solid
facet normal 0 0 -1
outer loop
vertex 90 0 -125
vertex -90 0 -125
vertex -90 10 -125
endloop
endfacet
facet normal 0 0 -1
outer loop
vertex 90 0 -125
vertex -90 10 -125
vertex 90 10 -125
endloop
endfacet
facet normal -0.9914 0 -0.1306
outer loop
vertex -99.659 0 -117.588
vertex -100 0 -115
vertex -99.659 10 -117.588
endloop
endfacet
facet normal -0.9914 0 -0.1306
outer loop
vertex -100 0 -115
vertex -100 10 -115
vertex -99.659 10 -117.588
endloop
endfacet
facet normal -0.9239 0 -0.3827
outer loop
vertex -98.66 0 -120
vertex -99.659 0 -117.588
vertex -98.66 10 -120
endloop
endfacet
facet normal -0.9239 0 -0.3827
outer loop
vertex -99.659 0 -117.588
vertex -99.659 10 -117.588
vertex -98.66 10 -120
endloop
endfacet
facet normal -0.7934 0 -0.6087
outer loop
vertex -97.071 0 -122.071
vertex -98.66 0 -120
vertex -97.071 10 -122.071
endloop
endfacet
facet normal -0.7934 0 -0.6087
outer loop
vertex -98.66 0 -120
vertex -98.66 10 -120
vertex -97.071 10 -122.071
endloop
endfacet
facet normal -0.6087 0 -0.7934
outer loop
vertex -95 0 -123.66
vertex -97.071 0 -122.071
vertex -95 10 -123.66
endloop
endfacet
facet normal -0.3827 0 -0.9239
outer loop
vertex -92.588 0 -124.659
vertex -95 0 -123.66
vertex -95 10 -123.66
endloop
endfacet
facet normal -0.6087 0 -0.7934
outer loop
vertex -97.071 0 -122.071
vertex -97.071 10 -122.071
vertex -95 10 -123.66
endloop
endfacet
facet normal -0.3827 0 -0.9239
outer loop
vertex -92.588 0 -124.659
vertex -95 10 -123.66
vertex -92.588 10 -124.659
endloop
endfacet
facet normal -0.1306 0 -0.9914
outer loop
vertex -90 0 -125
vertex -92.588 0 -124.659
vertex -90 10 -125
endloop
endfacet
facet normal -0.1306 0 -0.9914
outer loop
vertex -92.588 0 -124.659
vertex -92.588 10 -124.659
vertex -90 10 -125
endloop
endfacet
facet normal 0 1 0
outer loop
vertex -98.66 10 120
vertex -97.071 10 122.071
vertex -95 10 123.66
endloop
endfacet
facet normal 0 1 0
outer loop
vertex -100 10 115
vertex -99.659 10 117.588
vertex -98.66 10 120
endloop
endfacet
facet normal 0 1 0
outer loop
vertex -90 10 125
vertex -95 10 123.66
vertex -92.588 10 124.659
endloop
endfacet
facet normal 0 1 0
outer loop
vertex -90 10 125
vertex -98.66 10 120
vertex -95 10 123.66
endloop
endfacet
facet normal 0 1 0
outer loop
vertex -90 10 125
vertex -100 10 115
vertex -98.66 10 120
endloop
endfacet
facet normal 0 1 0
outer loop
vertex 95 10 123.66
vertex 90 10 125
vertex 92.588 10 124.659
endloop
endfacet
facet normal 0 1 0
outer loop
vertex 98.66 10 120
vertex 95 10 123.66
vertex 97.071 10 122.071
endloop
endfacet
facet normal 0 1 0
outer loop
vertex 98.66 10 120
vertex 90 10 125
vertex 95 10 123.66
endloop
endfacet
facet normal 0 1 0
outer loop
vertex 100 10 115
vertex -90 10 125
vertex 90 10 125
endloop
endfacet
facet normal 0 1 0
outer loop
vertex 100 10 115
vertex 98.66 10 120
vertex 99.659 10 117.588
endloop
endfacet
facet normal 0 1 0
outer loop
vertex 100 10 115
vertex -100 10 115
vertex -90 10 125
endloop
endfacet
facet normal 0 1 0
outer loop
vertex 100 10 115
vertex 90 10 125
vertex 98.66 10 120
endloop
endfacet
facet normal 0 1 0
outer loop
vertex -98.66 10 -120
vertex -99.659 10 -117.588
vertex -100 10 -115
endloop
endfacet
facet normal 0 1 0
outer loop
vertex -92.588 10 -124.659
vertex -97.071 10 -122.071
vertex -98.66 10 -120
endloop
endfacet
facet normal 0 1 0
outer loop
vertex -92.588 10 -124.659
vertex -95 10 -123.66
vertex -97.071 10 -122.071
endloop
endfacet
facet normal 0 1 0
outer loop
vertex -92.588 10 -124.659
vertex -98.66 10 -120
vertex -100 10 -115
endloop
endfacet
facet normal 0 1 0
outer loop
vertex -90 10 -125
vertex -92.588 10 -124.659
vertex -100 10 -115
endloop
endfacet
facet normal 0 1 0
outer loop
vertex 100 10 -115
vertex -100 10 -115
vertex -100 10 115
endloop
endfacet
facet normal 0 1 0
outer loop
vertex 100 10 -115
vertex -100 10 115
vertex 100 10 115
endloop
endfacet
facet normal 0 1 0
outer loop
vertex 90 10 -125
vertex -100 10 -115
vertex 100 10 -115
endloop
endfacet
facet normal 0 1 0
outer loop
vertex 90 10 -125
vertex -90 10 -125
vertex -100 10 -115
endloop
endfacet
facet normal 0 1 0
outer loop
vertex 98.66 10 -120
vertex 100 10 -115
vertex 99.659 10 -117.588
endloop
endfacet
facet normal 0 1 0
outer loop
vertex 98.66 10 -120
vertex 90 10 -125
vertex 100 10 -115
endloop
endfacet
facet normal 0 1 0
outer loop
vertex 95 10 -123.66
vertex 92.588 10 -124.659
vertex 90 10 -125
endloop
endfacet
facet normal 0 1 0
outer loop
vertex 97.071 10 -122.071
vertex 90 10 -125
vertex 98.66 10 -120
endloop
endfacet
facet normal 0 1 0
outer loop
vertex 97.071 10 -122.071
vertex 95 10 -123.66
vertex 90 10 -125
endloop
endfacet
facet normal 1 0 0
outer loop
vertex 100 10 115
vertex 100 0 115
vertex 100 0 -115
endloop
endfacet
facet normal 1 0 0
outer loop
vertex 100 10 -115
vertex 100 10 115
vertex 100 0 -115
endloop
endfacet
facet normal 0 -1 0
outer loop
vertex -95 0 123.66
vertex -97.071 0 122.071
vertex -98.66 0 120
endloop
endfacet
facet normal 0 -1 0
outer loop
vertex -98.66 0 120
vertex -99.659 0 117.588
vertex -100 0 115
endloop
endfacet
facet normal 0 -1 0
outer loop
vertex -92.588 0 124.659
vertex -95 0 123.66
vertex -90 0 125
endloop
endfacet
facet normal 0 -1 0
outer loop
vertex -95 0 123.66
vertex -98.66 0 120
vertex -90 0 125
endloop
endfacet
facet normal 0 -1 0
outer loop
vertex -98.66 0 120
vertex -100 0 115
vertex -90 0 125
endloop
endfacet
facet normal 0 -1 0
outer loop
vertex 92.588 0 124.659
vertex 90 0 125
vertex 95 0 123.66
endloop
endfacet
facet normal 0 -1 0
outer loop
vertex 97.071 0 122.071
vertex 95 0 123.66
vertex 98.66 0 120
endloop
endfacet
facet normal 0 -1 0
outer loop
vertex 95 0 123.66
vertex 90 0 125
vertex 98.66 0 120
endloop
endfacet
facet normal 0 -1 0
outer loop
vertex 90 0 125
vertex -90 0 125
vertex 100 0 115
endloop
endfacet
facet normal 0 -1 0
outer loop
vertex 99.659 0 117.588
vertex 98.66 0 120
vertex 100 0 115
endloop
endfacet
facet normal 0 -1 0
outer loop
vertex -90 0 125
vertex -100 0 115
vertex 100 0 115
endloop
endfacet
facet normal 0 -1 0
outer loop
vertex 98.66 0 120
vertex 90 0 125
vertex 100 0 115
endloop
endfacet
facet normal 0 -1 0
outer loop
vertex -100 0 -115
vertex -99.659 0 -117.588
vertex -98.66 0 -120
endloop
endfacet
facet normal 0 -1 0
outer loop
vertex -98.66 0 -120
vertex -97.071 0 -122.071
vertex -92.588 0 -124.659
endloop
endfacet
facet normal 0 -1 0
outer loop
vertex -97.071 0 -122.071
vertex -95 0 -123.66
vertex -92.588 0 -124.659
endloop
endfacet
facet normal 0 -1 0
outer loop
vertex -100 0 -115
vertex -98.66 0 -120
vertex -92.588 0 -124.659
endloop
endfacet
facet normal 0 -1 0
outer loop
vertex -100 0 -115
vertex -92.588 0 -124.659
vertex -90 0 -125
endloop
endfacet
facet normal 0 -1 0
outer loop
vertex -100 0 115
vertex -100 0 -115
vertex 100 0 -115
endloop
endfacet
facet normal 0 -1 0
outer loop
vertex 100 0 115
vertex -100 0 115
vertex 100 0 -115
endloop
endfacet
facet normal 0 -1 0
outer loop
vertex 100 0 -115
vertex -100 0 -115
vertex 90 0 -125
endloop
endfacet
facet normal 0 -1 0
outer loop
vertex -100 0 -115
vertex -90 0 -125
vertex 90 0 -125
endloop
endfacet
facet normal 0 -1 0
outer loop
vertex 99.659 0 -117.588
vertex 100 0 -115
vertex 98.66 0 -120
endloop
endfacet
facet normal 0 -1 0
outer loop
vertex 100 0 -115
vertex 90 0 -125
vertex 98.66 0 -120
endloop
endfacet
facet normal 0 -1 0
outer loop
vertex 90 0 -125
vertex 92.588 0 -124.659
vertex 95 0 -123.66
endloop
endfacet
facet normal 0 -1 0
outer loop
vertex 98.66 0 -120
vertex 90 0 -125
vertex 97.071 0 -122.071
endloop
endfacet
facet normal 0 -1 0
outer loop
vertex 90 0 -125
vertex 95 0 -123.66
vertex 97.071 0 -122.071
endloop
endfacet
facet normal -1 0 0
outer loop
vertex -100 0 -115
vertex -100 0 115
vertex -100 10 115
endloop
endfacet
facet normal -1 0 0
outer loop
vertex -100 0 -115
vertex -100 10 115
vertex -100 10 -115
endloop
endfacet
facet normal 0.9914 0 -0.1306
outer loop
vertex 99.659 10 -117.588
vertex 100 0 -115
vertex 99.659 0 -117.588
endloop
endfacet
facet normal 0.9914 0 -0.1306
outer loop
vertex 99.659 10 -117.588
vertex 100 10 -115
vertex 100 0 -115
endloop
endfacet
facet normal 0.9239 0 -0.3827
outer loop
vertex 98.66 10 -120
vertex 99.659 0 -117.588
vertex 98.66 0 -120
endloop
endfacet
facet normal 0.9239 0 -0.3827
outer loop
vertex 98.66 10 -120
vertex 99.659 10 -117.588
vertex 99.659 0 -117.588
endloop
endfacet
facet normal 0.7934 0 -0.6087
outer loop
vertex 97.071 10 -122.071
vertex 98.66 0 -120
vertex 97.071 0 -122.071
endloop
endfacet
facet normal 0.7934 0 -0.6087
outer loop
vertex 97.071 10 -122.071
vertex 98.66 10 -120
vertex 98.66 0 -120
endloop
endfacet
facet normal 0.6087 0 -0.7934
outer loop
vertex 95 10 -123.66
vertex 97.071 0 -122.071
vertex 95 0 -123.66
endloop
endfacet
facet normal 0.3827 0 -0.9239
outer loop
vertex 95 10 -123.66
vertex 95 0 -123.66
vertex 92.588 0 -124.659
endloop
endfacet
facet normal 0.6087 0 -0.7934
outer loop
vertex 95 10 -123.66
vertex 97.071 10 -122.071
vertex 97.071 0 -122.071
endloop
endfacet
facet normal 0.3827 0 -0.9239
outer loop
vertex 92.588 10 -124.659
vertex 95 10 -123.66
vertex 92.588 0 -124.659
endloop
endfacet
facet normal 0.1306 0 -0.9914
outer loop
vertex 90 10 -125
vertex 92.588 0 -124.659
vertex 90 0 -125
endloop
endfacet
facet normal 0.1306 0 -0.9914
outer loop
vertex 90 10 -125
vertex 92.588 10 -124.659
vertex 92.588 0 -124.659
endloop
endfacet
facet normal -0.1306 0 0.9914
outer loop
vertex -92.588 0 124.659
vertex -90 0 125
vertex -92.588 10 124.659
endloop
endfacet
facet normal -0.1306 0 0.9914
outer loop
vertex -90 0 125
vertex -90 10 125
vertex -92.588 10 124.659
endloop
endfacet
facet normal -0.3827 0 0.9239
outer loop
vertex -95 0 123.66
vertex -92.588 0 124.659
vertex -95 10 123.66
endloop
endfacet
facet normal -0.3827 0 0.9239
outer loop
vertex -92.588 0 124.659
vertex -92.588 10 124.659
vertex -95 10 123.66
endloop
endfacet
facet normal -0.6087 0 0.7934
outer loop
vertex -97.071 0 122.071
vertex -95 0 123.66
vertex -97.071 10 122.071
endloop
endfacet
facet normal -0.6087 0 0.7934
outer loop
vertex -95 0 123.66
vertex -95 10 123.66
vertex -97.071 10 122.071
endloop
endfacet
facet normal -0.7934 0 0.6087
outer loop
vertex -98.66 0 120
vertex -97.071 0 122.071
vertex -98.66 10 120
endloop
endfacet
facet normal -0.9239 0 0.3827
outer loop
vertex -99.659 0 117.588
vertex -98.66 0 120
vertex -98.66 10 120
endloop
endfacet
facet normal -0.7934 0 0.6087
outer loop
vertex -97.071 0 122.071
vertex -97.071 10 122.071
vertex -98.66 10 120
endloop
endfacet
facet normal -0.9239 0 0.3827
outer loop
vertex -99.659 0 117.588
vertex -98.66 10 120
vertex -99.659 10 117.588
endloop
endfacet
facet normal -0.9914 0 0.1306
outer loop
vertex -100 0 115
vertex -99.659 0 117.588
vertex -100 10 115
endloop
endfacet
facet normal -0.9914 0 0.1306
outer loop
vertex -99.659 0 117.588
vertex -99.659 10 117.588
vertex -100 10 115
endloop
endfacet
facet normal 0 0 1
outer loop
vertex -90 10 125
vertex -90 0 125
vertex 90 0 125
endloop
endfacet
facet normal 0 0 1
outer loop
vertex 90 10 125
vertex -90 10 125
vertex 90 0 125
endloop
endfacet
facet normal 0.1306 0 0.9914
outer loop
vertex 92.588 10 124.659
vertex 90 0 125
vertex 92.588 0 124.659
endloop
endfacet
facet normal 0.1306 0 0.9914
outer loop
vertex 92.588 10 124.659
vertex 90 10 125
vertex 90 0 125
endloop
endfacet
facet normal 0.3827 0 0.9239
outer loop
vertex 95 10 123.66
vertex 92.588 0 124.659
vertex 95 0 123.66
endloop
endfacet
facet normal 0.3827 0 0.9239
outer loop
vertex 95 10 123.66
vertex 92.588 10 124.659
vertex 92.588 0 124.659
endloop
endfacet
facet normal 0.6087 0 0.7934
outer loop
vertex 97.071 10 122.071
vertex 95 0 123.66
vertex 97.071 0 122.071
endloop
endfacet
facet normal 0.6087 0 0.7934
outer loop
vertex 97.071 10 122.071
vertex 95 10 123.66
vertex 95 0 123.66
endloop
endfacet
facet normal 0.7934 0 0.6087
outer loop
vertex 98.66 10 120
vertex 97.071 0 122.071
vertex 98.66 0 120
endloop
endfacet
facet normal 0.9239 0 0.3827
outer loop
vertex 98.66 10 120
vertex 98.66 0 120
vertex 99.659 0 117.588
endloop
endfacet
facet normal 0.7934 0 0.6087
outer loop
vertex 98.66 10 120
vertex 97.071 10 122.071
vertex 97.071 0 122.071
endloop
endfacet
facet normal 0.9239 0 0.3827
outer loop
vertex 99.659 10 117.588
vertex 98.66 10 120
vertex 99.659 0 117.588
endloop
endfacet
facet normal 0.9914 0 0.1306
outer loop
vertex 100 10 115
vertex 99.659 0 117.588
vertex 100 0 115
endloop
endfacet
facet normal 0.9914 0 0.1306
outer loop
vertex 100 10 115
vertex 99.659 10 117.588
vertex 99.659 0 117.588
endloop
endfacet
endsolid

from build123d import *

# Parameters (mm, degrees)
SKETCH1_W           = 200
SKETCH1_H           = 250
BOSS_EXTRUDE1_DEPTH = 10
FILLET1_R           = 10
FILLET2_R           = 10


with BuildPart() as part:
    # Sketch1 → Boss-Extrude1 (new body)
    with BuildSketch(Plane(origin=(0, 0, 0), x_dir=(1, 0, 0), z_dir=(0, 1, 0))):
        Rectangle(SKETCH1_W, SKETCH1_H)
    extrude(amount=BOSS_EXTRUDE1_DEPTH)

    # Fillet1
    fillet1_edges = [part.edges().sort_by_distance(p)[0] for p in [
        (100, 5, 125),
        (100, 5, -125),
    ]]
    fillet(fillet1_edges, radius=FILLET1_R)

    # Fillet2
    fillet2_edges = [part.edges().sort_by_distance(p)[0] for p in [
        (-100, 5, 125),
        (-100, 5, -125),
    ]]
    fillet(fillet2_edges, radius=FILLET2_R)


solid = part.part
